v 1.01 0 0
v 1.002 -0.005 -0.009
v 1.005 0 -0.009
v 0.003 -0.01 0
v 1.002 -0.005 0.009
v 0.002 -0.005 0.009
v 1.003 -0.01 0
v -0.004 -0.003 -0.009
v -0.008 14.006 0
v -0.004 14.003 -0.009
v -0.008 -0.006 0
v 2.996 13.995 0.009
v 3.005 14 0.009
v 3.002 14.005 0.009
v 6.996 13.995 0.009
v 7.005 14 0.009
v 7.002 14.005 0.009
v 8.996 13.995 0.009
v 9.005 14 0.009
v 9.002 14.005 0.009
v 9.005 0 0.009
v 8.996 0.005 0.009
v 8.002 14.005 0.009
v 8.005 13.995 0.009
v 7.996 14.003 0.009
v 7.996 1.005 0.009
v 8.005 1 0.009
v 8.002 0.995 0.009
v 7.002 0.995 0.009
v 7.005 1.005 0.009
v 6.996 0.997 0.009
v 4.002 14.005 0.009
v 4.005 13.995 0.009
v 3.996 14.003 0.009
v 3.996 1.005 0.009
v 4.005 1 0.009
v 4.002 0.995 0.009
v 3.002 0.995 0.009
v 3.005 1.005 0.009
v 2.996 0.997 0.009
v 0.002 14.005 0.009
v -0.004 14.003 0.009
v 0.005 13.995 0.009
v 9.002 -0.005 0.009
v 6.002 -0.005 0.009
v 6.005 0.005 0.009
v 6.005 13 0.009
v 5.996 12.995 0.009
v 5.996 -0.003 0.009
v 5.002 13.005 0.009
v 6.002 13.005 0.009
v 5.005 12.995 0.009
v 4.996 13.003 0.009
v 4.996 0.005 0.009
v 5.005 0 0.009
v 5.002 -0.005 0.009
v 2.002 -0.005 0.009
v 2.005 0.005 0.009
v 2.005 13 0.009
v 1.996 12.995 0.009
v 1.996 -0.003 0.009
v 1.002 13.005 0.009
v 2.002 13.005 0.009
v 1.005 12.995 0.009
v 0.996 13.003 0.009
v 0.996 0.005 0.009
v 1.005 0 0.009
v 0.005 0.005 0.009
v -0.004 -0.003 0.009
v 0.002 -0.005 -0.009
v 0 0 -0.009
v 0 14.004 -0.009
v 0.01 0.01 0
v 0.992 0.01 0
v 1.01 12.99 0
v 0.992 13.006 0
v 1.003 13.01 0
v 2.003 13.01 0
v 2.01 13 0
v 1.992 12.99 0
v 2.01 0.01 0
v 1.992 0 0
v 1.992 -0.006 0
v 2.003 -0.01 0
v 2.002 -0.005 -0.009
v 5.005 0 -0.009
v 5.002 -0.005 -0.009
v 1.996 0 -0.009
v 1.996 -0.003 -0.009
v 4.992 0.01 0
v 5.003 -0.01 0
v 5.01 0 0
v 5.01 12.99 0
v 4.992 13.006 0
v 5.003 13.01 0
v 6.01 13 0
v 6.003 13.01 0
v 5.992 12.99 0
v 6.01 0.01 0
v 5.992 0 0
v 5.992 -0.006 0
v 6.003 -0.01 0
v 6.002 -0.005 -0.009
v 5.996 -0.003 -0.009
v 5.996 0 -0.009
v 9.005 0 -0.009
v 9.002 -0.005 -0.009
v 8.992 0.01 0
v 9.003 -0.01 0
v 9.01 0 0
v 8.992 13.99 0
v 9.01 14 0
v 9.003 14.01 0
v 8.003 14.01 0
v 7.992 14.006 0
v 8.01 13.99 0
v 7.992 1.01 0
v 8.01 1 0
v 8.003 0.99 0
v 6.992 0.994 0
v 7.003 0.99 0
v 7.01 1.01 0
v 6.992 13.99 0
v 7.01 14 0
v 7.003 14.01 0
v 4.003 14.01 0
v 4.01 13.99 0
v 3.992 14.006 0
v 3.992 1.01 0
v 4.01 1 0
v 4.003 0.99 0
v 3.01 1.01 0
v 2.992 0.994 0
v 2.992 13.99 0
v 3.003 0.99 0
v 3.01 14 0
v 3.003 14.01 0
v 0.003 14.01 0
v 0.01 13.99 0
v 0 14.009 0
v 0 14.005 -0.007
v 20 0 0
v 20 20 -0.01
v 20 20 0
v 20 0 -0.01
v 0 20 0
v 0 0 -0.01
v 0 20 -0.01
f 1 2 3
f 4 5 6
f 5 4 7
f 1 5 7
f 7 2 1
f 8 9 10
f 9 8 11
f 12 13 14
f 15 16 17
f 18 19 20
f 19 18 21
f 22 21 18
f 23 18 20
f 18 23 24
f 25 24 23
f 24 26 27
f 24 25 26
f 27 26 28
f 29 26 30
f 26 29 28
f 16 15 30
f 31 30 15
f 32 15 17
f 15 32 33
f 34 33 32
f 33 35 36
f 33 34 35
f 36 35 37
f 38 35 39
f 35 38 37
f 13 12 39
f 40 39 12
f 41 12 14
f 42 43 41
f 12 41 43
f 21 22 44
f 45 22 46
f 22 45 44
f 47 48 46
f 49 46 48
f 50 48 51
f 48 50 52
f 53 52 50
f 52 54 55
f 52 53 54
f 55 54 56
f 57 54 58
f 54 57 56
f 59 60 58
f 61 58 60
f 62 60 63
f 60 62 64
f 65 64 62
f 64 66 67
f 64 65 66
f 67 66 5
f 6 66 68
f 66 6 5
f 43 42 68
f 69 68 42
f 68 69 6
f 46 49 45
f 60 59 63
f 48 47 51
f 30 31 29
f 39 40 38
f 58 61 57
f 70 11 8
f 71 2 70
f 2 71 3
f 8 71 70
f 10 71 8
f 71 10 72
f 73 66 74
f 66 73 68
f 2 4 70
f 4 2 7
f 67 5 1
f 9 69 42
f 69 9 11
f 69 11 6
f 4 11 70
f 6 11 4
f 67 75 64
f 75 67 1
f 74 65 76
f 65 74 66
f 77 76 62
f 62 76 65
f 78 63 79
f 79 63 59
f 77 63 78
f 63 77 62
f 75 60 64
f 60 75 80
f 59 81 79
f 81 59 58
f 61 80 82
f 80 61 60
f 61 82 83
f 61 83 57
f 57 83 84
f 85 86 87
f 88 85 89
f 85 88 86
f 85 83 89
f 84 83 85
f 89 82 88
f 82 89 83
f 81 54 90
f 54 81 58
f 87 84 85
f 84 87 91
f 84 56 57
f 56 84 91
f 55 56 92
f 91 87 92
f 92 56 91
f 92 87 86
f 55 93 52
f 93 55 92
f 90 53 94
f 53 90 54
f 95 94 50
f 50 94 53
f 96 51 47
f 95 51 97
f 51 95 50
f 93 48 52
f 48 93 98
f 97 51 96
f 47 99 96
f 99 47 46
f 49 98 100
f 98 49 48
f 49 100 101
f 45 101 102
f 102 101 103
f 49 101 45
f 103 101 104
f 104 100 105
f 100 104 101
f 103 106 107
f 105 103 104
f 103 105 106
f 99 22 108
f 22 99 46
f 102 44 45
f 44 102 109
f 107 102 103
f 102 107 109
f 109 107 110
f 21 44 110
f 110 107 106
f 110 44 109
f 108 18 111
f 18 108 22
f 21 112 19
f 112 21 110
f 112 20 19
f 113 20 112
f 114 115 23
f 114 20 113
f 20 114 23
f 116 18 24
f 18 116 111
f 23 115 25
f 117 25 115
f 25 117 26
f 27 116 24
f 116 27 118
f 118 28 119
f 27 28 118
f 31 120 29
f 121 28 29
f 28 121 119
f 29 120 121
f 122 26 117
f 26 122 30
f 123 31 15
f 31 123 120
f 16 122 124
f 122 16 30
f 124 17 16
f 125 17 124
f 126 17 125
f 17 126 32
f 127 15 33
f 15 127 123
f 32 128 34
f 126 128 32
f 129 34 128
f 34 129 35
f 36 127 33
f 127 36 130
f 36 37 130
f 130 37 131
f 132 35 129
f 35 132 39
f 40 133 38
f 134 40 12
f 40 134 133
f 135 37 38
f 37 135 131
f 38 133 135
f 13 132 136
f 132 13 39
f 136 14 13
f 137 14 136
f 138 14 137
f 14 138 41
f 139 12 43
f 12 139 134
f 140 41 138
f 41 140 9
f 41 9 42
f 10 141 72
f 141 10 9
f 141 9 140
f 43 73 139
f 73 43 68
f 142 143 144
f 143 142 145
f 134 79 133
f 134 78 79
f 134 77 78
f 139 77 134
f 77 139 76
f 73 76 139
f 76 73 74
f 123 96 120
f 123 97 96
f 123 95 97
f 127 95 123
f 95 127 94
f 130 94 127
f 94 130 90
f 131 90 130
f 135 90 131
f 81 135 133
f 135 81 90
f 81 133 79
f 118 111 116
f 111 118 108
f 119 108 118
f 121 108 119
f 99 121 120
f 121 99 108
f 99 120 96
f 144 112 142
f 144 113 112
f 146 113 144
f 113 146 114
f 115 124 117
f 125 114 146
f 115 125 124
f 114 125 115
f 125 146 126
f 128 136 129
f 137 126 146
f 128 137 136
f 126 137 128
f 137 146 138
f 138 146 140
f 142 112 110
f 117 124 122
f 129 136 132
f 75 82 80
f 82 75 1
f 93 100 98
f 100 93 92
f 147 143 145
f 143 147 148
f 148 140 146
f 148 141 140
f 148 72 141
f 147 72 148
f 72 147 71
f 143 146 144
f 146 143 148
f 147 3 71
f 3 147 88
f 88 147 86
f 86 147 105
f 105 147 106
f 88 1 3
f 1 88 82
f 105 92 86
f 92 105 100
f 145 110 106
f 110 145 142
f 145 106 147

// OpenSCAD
hull(){
    translate([0, 0]) sphere(0.01);
    translate([1, 0]) sphere(0.01);
}
hull(){
    translate([1, 0]) sphere(0.01);
    translate([1, 1]) sphere(0.01);
}
hull(){
    translate([1, 1]) sphere(0.01);
    translate([1, 2]) sphere(0.01);
}
hull(){
    translate([1, 2]) sphere(0.01);
    translate([1, 3]) sphere(0.01);
}
hull(){
    translate([1, 3]) sphere(0.01);
    translate([1, 4]) sphere(0.01);
}
hull(){
    translate([1, 4]) sphere(0.01);
    translate([1, 5]) sphere(0.01);
}
hull(){
    translate([1, 5]) sphere(0.01);
    translate([1, 6]) sphere(0.01);
}
hull(){
    translate([1, 6]) sphere(0.01);
    translate([1, 7]) sphere(0.01);
}
hull(){
    translate([1, 7]) sphere(0.01);
    translate([1, 8]) sphere(0.01);
}
hull(){
    translate([1, 8]) sphere(0.01);
    translate([1, 9]) sphere(0.01);
}
hull(){
    translate([1, 9]) sphere(0.01);
    translate([1, 10]) sphere(0.01);
}
hull(){
    translate([1, 10]) sphere(0.01);
    translate([1, 11]) sphere(0.01);
}
hull(){
    translate([1, 11]) sphere(0.01);
    translate([1, 12]) sphere(0.01);
}
hull(){
    translate([1, 12]) sphere(0.01);
    translate([1, 13]) sphere(0.01);
}
hull(){
    translate([1, 13]) sphere(0.01);
    translate([2, 13]) sphere(0.01);
}
hull(){
    translate([2, 13]) sphere(0.01);
    translate([2, 12]) sphere(0.01);
}
hull(){
    translate([2, 12]) sphere(0.01);
    translate([2, 11]) sphere(0.01);
}
hull(){
    translate([2, 11]) sphere(0.01);
    translate([2, 10]) sphere(0.01);
}
hull(){
    translate([2, 10]) sphere(0.01);
    translate([2, 9]) sphere(0.01);
}
hull(){
    translate([2, 9]) sphere(0.01);
    translate([2, 8]) sphere(0.01);
}
hull(){
    translate([2, 8]) sphere(0.01);
    translate([2, 7]) sphere(0.01);
}
hull(){
    translate([2, 7]) sphere(0.01);
    translate([2, 6]) sphere(0.01);
}
hull(){
    translate([2, 6]) sphere(0.01);
    translate([2, 5]) sphere(0.01);
}
hull(){
    translate([2, 5]) sphere(0.01);
    translate([2, 4]) sphere(0.01);
}
hull(){
    translate([2, 4]) sphere(0.01);
    translate([2, 3]) sphere(0.01);
}
hull(){
    translate([2, 3]) sphere(0.01);
    translate([2, 2]) sphere(0.01);
}
hull(){
    translate([2, 2]) sphere(0.01);
    translate([2, 1]) sphere(0.01);
}
hull(){
    translate([2, 1]) sphere(0.01);
    translate([2, 0]) sphere(0.01);
}
hull(){
    translate([2, 0]) sphere(0.01);
    translate([3, 0]) sphere(0.01);
}
hull(){
    translate([3, 0]) sphere(0.01);
    translate([4, 0]) sphere(0.01);
}
hull(){
    translate([4, 0]) sphere(0.01);
    translate([5, 0]) sphere(0.01);
}
hull(){
    translate([5, 0]) sphere(0.01);
    translate([5, 1]) sphere(0.01);
}
hull(){
    translate([5, 1]) sphere(0.01);
    translate([5, 2]) sphere(0.01);
}
hull(){
    translate([5, 2]) sphere(0.01);
    translate([5, 3]) sphere(0.01);
}
hull(){
    translate([5, 3]) sphere(0.01);
    translate([5, 4]) sphere(0.01);
}
hull(){
    translate([5, 4]) sphere(0.01);
    translate([5, 5]) sphere(0.01);
}
hull(){
    translate([5, 5]) sphere(0.01);
    translate([5, 6]) sphere(0.01);
}
hull(){
    translate([5, 6]) sphere(0.01);
    translate([5, 7]) sphere(0.01);
}
hull(){
    translate([5, 7]) sphere(0.01);
    translate([5, 8]) sphere(0.01);
}
hull(){
    translate([5, 8]) sphere(0.01);
    translate([5, 9]) sphere(0.01);
}
hull(){
    translate([5, 9]) sphere(0.01);
    translate([5, 10]) sphere(0.01);
}
hull(){
    translate([5, 10]) sphere(0.01);
    translate([5, 11]) sphere(0.01);
}
hull(){
    translate([5, 11]) sphere(0.01);
    translate([5, 12]) sphere(0.01);
}
hull(){
    translate([5, 12]) sphere(0.01);
    translate([5, 13]) sphere(0.01);
}
hull(){
    translate([5, 13]) sphere(0.01);
    translate([6, 13]) sphere(0.01);
}
hull(){
    translate([6, 13]) sphere(0.01);
    translate([6, 12]) sphere(0.01);
}
hull(){
    translate([6, 12]) sphere(0.01);
    translate([6, 11]) sphere(0.01);
}
hull(){
    translate([6, 11]) sphere(0.01);
    translate([6, 10]) sphere(0.01);
}
hull(){
    translate([6, 10]) sphere(0.01);
    translate([6, 9]) sphere(0.01);
}
hull(){
    translate([6, 9]) sphere(0.01);
    translate([6, 8]) sphere(0.01);
}
hull(){
    translate([6, 8]) sphere(0.01);
    translate([6, 7]) sphere(0.01);
}
hull(){
    translate([6, 7]) sphere(0.01);
    translate([6, 6]) sphere(0.01);
}
hull(){
    translate([6, 6]) sphere(0.01);
    translate([6, 5]) sphere(0.01);
}
hull(){
    translate([6, 5]) sphere(0.01);
    translate([6, 4]) sphere(0.01);
}
hull(){
    translate([6, 4]) sphere(0.01);
    translate([6, 3]) sphere(0.01);
}
hull(){
    translate([6, 3]) sphere(0.01);
    translate([6, 2]) sphere(0.01);
}
hull(){
    translate([6, 2]) sphere(0.01);
    translate([6, 1]) sphere(0.01);
}
hull(){
    translate([6, 1]) sphere(0.01);
    translate([6, 0]) sphere(0.01);
}
hull(){
    translate([6, 0]) sphere(0.01);
    translate([7, 0]) sphere(0.01);
}
hull(){
    translate([7, 0]) sphere(0.01);
    translate([8, 0]) sphere(0.01);
}
hull(){
    translate([8, 0]) sphere(0.01);
    translate([9, 0]) sphere(0.01);
}
hull(){
    translate([9, 0]) sphere(0.01);
    translate([9, 1]) sphere(0.01);
}
hull(){
    translate([9, 1]) sphere(0.01);
    translate([9, 2]) sphere(0.01);
}
hull(){
    translate([9, 2]) sphere(0.01);
    translate([9, 3]) sphere(0.01);
}
hull(){
    translate([9, 3]) sphere(0.01);
    translate([9, 4]) sphere(0.01);
}
hull(){
    translate([9, 4]) sphere(0.01);
    translate([9, 5]) sphere(0.01);
}
hull(){
    translate([9, 5]) sphere(0.01);
    translate([9, 6]) sphere(0.01);
}
hull(){
    translate([9, 6]) sphere(0.01);
    translate([9, 7]) sphere(0.01);
}
hull(){
    translate([9, 7]) sphere(0.01);
    translate([9, 8]) sphere(0.01);
}
hull(){
    translate([9, 8]) sphere(0.01);
    translate([9, 9]) sphere(0.01);
}
hull(){
    translate([9, 9]) sphere(0.01);
    translate([9, 10]) sphere(0.01);
}
hull(){
    translate([9, 10]) sphere(0.01);
    translate([9, 11]) sphere(0.01);
}
hull(){
    translate([9, 11]) sphere(0.01);
    translate([9, 12]) sphere(0.01);
}
hull(){
    translate([9, 12]) sphere(0.01);
    translate([9, 13]) sphere(0.01);
}
hull(){
    translate([9, 13]) sphere(0.01);
    translate([9, 14]) sphere(0.01);
}
hull(){
    translate([9, 14]) sphere(0.01);
    translate([8, 14]) sphere(0.01);
}
hull(){
    translate([8, 14]) sphere(0.01);
    translate([8, 13]) sphere(0.01);
}
hull(){
    translate([8, 13]) sphere(0.01);
    translate([8, 12]) sphere(0.01);
}
hull(){
    translate([8, 12]) sphere(0.01);
    translate([8, 11]) sphere(0.01);
}
hull(){
    translate([8, 11]) sphere(0.01);
    translate([8, 10]) sphere(0.01);
}
hull(){
    translate([8, 10]) sphere(0.01);
    translate([8, 9]) sphere(0.01);
}
hull(){
    translate([8, 9]) sphere(0.01);
    translate([8, 8]) sphere(0.01);
}
hull(){
    translate([8, 8]) sphere(0.01);
    translate([8, 7]) sphere(0.01);
}
hull(){
    translate([8, 7]) sphere(0.01);
    translate([8, 6]) sphere(0.01);
}
hull(){
    translate([8, 6]) sphere(0.01);
    translate([8, 5]) sphere(0.01);
}
hull(){
    translate([8, 5]) sphere(0.01);
    translate([8, 4]) sphere(0.01);
}
hull(){
    translate([8, 4]) sphere(0.01);
    translate([8, 3]) sphere(0.01);
}
hull(){
    translate([8, 3]) sphere(0.01);
    translate([8, 2]) sphere(0.01);
}
hull(){
    translate([8, 2]) sphere(0.01);
    translate([8, 1]) sphere(0.01);
}
hull(){
    translate([8, 1]) sphere(0.01);
    translate([7, 1]) sphere(0.01);
}
hull(){
    translate([7, 1]) sphere(0.01);
    translate([7, 2]) sphere(0.01);
}
hull(){
    translate([7, 2]) sphere(0.01);
    translate([7, 3]) sphere(0.01);
}
hull(){
    translate([7, 3]) sphere(0.01);
    translate([7, 4]) sphere(0.01);
}
hull(){
    translate([7, 4]) sphere(0.01);
    translate([7, 5]) sphere(0.01);
}
hull(){
    translate([7, 5]) sphere(0.01);
    translate([7, 6]) sphere(0.01);
}
hull(){
    translate([7, 6]) sphere(0.01);
    translate([7, 7]) sphere(0.01);
}
hull(){
    translate([7, 7]) sphere(0.01);
    translate([7, 8]) sphere(0.01);
}
hull(){
    translate([7, 8]) sphere(0.01);
    translate([7, 9]) sphere(0.01);
}
hull(){
    translate([7, 9]) sphere(0.01);
    translate([7, 10]) sphere(0.01);
}
hull(){
    translate([7, 10]) sphere(0.01);
    translate([7, 11]) sphere(0.01);
}
hull(){
    translate([7, 11]) sphere(0.01);
    translate([7, 12]) sphere(0.01);
}
hull(){
    translate([7, 12]) sphere(0.01);
    translate([7, 13]) sphere(0.01);
}
hull(){
    translate([7, 13]) sphere(0.01);
    translate([7, 14]) sphere(0.01);
}
hull(){
    translate([7, 14]) sphere(0.01);
    translate([6, 14]) sphere(0.01);
}
hull(){
    translate([6, 14]) sphere(0.01);
    translate([5, 14]) sphere(0.01);
}
hull(){
    translate([5, 14]) sphere(0.01);
    translate([4, 14]) sphere(0.01);
}
hull(){
    translate([4, 14]) sphere(0.01);
    translate([4, 13]) sphere(0.01);
}
hull(){
    translate([4, 13]) sphere(0.01);
    translate([4, 12]) sphere(0.01);
}
hull(){
    translate([4, 12]) sphere(0.01);
    translate([4, 11]) sphere(0.01);
}
hull(){
    translate([4, 11]) sphere(0.01);
    translate([4, 10]) sphere(0.01);
}
hull(){
    translate([4, 10]) sphere(0.01);
    translate([4, 9]) sphere(0.01);
}
hull(){
    translate([4, 9]) sphere(0.01);
    translate([4, 8]) sphere(0.01);
}
hull(){
    translate([4, 8]) sphere(0.01);
    translate([4, 7]) sphere(0.01);
}
hull(){
    translate([4, 7]) sphere(0.01);
    translate([4, 6]) sphere(0.01);
}
hull(){
    translate([4, 6]) sphere(0.01);
    translate([4, 5]) sphere(0.01);
}
hull(){
    translate([4, 5]) sphere(0.01);
    translate([4, 4]) sphere(0.01);
}
hull(){
    translate([4, 4]) sphere(0.01);
    translate([4, 3]) sphere(0.01);
}
hull(){
    translate([4, 3]) sphere(0.01);
    translate([4, 2]) sphere(0.01);
}
hull(){
    translate([4, 2]) sphere(0.01);
    translate([4, 1]) sphere(0.01);
}
hull(){
    translate([4, 1]) sphere(0.01);
    translate([3, 1]) sphere(0.01);
}
hull(){
    translate([3, 1]) sphere(0.01);
    translate([3, 2]) sphere(0.01);
}
hull(){
    translate([3, 2]) sphere(0.01);
    translate([3, 3]) sphere(0.01);
}
hull(){
    translate([3, 3]) sphere(0.01);
    translate([3, 4]) sphere(0.01);
}
hull(){
    translate([3, 4]) sphere(0.01);
    translate([3, 5]) sphere(0.01);
}
hull(){
    translate([3, 5]) sphere(0.01);
    translate([3, 6]) sphere(0.01);
}
hull(){
    translate([3, 6]) sphere(0.01);
    translate([3, 7]) sphere(0.01);
}
hull(){
    translate([3, 7]) sphere(0.01);
    translate([3, 8]) sphere(0.01);
}
hull(){
    translate([3, 8]) sphere(0.01);
    translate([3, 9]) sphere(0.01);
}
hull(){
    translate([3, 9]) sphere(0.01);
    translate([3, 10]) sphere(0.01);
}
hull(){
    translate([3, 10]) sphere(0.01);
    translate([3, 11]) sphere(0.01);
}
hull(){
    translate([3, 11]) sphere(0.01);
    translate([3, 12]) sphere(0.01);
}
hull(){
    translate([3, 12]) sphere(0.01);
    translate([3, 13]) sphere(0.01);
}
hull(){
    translate([3, 13]) sphere(0.01);
    translate([3, 14]) sphere(0.01);
}
hull(){
    translate([3, 14]) sphere(0.01);
    translate([2, 14]) sphere(0.01);
}
hull(){
    translate([2, 14]) sphere(0.01);
    translate([1, 14]) sphere(0.01);
}
hull(){
    translate([1, 14]) sphere(0.01);
    translate([0, 14]) sphere(0.01);
}
hull(){
    translate([0, 14]) sphere(0.01);
    translate([0, 13]) sphere(0.01);
}
hull(){
    translate([0, 13]) sphere(0.01);
    translate([0, 12]) sphere(0.01);
}
hull(){
    translate([0, 12]) sphere(0.01);
    translate([0, 11]) sphere(0.01);
}
hull(){
    translate([0, 11]) sphere(0.01);
    translate([0, 10]) sphere(0.01);
}
hull(){
    translate([0, 10]) sphere(0.01);
    translate([0, 9]) sphere(0.01);
}
hull(){
    translate([0, 9]) sphere(0.01);
    translate([0, 8]) sphere(0.01);
}
hull(){
    translate([0, 8]) sphere(0.01);
    translate([0, 7]) sphere(0.01);
}
hull(){
    translate([0, 7]) sphere(0.01);
    translate([0, 6]) sphere(0.01);
}
hull(){
    translate([0, 6]) sphere(0.01);
    translate([0, 5]) sphere(0.01);
}
hull(){
    translate([0, 5]) sphere(0.01);
    translate([0, 4]) sphere(0.01);
}
hull(){
    translate([0, 4]) sphere(0.01);
    translate([0, 3]) sphere(0.01);
}
hull(){
    translate([0, 3]) sphere(0.01);
    translate([0, 2]) sphere(0.01);
}
hull(){
    translate([0, 2]) sphere(0.01);
    translate([0, 1]) sphere(0.01);
}
hull(){
    translate([0, 1]) sphere(0.01);
    translate([0, 0]) sphere(0.01);
}
translate([0,0,-0.01]) color([0.1,0.1,0.1]) cube([20,20,0.01]);
